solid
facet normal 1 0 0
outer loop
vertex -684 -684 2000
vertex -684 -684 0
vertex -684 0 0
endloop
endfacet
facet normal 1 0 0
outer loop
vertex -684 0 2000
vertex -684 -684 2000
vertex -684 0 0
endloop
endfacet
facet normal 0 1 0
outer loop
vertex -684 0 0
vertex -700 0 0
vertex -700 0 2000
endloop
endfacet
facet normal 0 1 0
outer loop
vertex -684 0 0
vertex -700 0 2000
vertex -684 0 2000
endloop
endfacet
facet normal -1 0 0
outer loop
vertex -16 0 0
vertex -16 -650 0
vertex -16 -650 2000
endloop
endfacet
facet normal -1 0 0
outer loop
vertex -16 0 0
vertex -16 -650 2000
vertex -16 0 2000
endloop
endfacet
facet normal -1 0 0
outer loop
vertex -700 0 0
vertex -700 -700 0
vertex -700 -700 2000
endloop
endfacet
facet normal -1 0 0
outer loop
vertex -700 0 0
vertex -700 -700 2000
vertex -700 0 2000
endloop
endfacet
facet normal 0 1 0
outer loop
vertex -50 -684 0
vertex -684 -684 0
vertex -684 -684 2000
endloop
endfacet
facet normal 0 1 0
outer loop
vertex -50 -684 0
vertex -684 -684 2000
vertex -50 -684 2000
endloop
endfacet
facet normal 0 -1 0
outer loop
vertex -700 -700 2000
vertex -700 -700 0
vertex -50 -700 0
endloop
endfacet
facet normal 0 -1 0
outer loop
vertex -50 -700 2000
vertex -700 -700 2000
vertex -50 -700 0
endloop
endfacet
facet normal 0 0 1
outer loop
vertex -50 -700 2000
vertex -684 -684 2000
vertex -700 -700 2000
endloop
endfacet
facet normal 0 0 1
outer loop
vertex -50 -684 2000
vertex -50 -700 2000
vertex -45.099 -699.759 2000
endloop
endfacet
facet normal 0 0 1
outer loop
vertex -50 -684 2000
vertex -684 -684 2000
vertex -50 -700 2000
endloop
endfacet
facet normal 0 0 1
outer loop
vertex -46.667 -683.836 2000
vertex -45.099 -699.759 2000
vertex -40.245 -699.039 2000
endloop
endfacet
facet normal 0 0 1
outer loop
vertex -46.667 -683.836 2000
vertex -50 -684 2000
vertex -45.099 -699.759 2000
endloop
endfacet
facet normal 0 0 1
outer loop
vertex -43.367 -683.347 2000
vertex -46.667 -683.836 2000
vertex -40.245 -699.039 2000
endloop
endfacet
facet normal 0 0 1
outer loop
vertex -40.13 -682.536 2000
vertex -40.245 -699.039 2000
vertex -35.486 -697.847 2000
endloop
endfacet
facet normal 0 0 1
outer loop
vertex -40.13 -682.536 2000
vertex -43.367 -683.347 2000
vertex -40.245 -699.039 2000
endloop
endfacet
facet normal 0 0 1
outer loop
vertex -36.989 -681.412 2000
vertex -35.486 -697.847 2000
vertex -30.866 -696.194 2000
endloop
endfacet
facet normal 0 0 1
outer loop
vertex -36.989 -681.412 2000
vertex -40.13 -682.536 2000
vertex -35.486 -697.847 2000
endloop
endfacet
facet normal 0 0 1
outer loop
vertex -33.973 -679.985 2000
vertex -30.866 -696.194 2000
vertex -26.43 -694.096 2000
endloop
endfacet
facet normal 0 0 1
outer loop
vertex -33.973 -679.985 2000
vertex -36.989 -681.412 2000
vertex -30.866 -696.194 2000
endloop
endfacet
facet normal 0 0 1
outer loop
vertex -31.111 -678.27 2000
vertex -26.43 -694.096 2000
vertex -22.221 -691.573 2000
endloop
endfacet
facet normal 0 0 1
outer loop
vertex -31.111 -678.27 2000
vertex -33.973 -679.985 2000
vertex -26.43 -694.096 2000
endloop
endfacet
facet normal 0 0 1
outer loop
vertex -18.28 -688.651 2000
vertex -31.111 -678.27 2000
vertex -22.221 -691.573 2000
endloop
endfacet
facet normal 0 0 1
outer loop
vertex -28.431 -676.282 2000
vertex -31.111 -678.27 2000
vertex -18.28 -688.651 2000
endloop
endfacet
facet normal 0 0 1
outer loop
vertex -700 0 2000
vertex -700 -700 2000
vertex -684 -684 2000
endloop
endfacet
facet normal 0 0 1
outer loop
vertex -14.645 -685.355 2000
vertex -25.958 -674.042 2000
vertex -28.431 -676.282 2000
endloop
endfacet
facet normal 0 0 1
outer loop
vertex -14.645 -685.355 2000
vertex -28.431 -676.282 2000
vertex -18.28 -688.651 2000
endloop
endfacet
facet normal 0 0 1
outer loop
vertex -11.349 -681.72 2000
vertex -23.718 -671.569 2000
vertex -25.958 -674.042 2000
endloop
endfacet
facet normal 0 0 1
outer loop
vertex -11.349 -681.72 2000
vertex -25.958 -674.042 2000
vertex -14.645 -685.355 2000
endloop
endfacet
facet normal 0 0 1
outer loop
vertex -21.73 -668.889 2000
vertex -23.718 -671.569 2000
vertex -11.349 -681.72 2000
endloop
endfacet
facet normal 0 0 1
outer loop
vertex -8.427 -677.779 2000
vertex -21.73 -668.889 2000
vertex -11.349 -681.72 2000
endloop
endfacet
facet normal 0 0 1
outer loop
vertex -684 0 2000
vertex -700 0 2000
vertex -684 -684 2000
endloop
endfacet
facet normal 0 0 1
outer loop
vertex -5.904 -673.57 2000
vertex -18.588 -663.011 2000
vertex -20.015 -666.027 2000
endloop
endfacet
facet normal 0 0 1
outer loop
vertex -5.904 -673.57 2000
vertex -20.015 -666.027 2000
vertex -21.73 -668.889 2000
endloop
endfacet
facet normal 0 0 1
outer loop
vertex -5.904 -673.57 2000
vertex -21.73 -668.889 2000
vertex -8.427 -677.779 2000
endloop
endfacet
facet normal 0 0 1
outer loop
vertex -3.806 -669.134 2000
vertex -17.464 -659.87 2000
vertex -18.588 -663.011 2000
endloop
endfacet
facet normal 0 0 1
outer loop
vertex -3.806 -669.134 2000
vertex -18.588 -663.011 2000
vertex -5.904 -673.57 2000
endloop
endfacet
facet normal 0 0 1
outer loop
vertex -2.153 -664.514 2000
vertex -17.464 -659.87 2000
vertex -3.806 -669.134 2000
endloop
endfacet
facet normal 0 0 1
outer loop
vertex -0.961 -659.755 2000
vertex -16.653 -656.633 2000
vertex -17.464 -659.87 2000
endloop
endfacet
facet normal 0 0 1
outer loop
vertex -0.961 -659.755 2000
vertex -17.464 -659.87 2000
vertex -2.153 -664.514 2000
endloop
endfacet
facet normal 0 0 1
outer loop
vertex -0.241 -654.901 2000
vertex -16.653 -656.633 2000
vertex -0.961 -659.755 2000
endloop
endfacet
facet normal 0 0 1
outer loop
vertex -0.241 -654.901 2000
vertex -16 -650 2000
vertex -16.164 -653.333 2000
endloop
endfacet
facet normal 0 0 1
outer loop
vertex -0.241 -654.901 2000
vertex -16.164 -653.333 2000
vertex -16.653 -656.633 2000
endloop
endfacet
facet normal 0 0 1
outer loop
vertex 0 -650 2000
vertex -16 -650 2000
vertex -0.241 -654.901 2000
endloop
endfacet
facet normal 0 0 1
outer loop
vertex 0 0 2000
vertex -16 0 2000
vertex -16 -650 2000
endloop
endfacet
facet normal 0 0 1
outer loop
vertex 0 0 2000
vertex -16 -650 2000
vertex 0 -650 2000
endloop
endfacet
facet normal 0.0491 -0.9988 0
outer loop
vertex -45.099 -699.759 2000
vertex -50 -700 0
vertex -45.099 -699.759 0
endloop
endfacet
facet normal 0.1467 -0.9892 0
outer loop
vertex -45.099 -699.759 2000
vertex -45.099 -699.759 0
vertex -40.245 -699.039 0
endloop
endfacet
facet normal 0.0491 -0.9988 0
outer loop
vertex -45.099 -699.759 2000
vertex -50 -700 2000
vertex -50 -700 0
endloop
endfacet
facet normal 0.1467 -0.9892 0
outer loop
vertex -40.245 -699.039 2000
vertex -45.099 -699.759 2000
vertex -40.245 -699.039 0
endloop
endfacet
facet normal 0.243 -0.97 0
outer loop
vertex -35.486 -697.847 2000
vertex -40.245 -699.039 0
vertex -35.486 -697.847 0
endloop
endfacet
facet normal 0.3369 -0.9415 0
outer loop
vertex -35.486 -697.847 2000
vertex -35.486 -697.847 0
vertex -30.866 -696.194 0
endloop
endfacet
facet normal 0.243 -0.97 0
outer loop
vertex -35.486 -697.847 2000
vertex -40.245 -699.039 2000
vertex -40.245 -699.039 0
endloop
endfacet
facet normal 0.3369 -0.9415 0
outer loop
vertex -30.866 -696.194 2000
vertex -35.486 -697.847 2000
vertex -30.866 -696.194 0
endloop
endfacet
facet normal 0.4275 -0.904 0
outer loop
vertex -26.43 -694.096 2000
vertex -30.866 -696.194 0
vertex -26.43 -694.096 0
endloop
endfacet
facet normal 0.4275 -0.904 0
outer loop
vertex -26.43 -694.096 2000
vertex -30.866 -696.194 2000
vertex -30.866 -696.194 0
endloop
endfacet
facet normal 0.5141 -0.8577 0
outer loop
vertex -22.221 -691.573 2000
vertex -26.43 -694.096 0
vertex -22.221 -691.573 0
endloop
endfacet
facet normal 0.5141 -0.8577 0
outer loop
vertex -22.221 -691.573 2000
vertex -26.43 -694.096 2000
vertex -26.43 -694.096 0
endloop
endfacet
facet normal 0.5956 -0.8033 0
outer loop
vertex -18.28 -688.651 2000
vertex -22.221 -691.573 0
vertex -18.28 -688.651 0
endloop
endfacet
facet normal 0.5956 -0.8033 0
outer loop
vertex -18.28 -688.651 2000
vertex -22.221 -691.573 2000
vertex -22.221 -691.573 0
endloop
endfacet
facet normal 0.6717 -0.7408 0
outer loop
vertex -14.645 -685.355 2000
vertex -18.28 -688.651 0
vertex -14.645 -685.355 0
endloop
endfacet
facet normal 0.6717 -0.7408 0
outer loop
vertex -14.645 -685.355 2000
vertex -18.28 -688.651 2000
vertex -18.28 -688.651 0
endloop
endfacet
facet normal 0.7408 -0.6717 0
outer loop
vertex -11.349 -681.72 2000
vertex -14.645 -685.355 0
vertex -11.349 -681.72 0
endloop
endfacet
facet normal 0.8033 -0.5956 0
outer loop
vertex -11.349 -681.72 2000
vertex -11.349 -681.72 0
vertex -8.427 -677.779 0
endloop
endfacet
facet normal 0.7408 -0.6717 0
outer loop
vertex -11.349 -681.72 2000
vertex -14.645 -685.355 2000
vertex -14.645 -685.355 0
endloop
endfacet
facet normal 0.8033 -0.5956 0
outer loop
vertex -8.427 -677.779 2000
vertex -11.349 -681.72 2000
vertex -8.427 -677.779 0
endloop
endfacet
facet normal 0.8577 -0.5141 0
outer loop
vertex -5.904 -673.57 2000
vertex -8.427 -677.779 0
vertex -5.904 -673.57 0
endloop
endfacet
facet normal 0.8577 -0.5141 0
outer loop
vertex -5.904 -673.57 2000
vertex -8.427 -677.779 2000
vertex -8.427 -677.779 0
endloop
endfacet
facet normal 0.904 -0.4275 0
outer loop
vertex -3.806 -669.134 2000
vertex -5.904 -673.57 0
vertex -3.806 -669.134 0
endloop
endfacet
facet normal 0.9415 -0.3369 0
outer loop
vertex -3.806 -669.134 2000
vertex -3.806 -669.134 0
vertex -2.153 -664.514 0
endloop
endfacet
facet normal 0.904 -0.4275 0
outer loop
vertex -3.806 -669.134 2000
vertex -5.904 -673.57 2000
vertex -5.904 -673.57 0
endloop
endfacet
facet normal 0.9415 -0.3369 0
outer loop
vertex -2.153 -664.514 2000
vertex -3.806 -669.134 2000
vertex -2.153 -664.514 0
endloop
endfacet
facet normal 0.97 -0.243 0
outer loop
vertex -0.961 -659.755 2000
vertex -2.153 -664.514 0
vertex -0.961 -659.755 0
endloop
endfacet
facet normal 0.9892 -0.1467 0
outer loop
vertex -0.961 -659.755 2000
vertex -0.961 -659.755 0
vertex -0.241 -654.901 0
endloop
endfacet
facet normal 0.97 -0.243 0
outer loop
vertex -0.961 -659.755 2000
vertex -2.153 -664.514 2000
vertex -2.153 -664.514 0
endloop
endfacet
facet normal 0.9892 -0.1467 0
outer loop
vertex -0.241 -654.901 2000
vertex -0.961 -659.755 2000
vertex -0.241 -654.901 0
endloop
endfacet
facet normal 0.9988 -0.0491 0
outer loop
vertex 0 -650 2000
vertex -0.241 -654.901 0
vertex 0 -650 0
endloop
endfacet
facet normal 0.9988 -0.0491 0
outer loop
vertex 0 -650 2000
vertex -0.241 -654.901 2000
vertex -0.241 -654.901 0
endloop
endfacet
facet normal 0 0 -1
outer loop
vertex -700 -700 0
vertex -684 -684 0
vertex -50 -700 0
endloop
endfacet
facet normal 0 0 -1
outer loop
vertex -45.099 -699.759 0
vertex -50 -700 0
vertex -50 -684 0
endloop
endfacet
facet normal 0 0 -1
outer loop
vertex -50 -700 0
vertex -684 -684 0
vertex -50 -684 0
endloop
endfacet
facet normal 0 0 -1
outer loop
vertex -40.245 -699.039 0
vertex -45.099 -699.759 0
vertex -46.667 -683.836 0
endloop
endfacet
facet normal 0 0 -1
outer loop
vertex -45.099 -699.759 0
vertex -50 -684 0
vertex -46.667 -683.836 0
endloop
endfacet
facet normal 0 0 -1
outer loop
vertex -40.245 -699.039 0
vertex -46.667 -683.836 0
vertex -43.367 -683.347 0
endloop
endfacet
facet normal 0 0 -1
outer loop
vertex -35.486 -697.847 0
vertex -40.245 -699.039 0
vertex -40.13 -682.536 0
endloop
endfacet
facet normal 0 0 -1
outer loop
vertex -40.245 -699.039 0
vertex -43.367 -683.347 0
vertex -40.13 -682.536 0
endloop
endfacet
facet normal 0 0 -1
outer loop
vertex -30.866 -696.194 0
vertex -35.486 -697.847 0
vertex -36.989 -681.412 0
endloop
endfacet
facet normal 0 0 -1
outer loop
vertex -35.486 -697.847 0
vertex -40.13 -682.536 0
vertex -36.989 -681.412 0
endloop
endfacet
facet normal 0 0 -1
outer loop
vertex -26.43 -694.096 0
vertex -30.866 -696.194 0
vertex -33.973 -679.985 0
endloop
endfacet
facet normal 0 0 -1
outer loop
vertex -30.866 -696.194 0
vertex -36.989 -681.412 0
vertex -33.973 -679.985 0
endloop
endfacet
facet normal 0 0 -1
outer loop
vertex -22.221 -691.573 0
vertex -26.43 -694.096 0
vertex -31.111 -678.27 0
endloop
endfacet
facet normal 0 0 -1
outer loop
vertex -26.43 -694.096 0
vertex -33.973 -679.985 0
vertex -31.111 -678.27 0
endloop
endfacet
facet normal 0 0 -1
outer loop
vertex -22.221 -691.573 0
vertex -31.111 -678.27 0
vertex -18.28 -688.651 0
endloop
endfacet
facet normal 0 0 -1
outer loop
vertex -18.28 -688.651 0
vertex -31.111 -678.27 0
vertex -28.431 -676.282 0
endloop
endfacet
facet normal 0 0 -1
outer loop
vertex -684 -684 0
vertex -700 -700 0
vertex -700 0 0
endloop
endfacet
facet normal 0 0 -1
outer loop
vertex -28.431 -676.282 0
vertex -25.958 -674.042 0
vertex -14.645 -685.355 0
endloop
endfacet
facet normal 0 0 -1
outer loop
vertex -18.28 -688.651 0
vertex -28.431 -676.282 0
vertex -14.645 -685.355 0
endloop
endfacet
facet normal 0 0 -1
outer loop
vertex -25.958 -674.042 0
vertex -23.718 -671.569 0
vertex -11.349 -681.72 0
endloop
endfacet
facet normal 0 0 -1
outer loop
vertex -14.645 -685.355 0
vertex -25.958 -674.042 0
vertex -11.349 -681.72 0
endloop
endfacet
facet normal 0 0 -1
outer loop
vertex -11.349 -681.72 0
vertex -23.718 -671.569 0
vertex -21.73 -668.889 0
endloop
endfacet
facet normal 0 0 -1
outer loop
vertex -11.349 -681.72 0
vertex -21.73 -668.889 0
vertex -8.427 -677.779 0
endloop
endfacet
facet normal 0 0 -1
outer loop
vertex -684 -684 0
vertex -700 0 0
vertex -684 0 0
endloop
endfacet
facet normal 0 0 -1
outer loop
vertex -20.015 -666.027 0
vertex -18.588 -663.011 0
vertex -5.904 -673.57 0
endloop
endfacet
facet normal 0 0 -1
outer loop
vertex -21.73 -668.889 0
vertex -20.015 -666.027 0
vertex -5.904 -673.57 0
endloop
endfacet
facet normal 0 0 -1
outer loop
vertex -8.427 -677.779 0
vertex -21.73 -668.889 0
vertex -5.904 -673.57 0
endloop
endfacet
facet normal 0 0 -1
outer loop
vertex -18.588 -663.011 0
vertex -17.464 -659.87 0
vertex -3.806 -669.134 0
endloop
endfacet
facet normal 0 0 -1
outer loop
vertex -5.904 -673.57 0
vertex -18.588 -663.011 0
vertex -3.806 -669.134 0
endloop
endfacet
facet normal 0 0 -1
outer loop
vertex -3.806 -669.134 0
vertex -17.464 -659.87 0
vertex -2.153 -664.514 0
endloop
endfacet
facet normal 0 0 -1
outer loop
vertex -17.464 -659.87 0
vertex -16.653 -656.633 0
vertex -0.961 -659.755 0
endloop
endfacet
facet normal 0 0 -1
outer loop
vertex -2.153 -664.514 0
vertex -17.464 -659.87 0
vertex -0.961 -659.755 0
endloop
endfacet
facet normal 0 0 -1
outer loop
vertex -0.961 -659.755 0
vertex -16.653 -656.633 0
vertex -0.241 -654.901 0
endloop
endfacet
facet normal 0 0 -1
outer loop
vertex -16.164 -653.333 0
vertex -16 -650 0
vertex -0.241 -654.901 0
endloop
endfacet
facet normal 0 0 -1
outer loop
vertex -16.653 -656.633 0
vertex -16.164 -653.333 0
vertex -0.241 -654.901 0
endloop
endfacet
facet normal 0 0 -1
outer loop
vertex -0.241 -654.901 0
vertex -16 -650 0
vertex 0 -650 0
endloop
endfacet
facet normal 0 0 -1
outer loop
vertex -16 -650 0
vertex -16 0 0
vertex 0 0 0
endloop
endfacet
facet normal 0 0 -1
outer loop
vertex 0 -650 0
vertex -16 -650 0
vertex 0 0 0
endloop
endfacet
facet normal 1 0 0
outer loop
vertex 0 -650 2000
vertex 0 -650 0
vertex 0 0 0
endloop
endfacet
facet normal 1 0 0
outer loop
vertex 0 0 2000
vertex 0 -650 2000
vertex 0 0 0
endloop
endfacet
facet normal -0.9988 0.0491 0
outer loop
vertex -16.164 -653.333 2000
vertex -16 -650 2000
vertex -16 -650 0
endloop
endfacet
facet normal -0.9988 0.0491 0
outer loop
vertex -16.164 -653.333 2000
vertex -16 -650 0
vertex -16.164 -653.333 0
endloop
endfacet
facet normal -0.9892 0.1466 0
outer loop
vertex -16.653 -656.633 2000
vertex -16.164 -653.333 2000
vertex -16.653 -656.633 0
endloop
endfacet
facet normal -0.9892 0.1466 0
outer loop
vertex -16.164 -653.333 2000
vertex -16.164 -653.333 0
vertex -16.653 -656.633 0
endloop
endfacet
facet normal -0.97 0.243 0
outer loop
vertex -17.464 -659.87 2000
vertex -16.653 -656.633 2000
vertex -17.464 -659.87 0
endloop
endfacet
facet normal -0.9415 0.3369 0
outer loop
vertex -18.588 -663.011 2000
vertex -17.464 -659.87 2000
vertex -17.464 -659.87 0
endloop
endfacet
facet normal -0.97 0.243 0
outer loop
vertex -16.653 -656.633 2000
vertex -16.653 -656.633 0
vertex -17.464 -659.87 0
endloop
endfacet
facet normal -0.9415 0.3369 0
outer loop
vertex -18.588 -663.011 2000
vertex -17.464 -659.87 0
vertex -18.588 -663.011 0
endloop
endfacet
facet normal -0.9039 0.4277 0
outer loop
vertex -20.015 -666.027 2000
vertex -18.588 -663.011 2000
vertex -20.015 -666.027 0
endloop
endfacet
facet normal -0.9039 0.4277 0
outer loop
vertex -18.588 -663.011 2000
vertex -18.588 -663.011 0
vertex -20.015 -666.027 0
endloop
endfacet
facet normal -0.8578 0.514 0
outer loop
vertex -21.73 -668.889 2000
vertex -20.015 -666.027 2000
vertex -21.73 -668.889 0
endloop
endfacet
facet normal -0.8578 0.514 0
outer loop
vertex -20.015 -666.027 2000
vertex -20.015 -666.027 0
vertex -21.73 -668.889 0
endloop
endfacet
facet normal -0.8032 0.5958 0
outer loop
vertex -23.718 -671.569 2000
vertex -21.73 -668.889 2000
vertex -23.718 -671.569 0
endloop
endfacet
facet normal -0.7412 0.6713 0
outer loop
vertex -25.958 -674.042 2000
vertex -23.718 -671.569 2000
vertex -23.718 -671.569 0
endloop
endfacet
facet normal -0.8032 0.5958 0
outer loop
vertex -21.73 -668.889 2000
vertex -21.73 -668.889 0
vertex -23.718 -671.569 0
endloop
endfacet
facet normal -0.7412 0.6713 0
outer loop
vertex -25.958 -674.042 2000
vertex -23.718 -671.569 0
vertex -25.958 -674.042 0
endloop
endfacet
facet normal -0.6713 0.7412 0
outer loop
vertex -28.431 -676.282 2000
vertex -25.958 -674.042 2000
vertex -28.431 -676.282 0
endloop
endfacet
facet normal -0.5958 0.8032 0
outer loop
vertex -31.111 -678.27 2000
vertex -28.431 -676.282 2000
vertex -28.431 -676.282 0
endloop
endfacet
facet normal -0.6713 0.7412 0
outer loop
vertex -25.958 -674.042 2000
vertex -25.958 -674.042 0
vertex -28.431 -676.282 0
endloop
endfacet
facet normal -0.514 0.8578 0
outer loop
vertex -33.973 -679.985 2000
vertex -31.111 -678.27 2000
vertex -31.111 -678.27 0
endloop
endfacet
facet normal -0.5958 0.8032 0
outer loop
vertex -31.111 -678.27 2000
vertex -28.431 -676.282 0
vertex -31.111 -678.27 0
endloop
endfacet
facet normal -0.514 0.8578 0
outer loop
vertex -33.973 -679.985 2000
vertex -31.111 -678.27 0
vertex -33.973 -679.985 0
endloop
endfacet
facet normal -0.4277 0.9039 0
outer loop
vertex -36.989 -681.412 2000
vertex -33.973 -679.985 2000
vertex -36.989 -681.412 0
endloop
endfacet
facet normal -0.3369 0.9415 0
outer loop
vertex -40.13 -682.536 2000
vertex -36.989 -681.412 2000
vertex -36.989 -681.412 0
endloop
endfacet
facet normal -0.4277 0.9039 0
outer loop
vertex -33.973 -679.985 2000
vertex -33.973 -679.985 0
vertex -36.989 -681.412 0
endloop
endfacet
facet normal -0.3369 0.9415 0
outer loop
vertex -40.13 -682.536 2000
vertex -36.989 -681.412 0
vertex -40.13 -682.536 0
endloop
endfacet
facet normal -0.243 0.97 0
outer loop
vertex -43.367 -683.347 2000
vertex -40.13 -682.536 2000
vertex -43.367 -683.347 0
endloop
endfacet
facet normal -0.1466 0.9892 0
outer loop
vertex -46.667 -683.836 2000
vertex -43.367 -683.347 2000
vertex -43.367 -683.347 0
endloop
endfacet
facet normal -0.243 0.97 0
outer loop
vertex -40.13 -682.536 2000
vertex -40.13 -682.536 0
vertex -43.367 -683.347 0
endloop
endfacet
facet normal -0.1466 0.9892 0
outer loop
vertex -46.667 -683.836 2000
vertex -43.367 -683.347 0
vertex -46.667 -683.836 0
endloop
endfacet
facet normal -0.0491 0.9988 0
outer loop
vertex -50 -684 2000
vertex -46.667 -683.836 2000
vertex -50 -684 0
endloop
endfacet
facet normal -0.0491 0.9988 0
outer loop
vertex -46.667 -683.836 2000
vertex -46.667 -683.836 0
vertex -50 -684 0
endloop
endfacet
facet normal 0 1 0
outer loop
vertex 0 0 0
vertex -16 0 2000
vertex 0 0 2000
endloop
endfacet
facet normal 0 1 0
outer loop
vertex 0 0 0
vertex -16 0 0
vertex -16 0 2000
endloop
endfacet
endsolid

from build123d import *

# Parameters (mm, degrees)
F0_W     = 700
F0_H     = 700
F1_DEPTH = 2000
F2_T     = -16
F3_R     = 50
F4_R     = 34


# Not quite as in the source:
# - a feature names something its author has since deleted; it is built from what else it names


with BuildPart() as f1:
    # F0 (on Top) → F1 (new body)
    with BuildSketch(Plane.XY):
        with Locations((-350, -350)):
            Rectangle(F0_W, F0_H)
    extrude(amount=F1_DEPTH)

    # F2
    f2_openings = [f1.faces().sort_by_distance(p)[0] for p in [
        (-350, 0, 1000),
        (-350, -350, 2000),
        (-350, -350, 0),
    ]]
    offset(amount=F2_T, openings=f2_openings)

    # F3
    f3_edges = [f1.edges().sort_by_distance(p)[0] for p in [
        (0, -700, 1000),
    ]]
    fillet(f3_edges, radius=F3_R)

    # F4
    f4_edges = [f1.edges().sort_by_distance(p)[0] for p in [
        (-16, -684, 1000),
    ]]
    fillet(f4_edges, radius=F4_R)


solid = f1.part
